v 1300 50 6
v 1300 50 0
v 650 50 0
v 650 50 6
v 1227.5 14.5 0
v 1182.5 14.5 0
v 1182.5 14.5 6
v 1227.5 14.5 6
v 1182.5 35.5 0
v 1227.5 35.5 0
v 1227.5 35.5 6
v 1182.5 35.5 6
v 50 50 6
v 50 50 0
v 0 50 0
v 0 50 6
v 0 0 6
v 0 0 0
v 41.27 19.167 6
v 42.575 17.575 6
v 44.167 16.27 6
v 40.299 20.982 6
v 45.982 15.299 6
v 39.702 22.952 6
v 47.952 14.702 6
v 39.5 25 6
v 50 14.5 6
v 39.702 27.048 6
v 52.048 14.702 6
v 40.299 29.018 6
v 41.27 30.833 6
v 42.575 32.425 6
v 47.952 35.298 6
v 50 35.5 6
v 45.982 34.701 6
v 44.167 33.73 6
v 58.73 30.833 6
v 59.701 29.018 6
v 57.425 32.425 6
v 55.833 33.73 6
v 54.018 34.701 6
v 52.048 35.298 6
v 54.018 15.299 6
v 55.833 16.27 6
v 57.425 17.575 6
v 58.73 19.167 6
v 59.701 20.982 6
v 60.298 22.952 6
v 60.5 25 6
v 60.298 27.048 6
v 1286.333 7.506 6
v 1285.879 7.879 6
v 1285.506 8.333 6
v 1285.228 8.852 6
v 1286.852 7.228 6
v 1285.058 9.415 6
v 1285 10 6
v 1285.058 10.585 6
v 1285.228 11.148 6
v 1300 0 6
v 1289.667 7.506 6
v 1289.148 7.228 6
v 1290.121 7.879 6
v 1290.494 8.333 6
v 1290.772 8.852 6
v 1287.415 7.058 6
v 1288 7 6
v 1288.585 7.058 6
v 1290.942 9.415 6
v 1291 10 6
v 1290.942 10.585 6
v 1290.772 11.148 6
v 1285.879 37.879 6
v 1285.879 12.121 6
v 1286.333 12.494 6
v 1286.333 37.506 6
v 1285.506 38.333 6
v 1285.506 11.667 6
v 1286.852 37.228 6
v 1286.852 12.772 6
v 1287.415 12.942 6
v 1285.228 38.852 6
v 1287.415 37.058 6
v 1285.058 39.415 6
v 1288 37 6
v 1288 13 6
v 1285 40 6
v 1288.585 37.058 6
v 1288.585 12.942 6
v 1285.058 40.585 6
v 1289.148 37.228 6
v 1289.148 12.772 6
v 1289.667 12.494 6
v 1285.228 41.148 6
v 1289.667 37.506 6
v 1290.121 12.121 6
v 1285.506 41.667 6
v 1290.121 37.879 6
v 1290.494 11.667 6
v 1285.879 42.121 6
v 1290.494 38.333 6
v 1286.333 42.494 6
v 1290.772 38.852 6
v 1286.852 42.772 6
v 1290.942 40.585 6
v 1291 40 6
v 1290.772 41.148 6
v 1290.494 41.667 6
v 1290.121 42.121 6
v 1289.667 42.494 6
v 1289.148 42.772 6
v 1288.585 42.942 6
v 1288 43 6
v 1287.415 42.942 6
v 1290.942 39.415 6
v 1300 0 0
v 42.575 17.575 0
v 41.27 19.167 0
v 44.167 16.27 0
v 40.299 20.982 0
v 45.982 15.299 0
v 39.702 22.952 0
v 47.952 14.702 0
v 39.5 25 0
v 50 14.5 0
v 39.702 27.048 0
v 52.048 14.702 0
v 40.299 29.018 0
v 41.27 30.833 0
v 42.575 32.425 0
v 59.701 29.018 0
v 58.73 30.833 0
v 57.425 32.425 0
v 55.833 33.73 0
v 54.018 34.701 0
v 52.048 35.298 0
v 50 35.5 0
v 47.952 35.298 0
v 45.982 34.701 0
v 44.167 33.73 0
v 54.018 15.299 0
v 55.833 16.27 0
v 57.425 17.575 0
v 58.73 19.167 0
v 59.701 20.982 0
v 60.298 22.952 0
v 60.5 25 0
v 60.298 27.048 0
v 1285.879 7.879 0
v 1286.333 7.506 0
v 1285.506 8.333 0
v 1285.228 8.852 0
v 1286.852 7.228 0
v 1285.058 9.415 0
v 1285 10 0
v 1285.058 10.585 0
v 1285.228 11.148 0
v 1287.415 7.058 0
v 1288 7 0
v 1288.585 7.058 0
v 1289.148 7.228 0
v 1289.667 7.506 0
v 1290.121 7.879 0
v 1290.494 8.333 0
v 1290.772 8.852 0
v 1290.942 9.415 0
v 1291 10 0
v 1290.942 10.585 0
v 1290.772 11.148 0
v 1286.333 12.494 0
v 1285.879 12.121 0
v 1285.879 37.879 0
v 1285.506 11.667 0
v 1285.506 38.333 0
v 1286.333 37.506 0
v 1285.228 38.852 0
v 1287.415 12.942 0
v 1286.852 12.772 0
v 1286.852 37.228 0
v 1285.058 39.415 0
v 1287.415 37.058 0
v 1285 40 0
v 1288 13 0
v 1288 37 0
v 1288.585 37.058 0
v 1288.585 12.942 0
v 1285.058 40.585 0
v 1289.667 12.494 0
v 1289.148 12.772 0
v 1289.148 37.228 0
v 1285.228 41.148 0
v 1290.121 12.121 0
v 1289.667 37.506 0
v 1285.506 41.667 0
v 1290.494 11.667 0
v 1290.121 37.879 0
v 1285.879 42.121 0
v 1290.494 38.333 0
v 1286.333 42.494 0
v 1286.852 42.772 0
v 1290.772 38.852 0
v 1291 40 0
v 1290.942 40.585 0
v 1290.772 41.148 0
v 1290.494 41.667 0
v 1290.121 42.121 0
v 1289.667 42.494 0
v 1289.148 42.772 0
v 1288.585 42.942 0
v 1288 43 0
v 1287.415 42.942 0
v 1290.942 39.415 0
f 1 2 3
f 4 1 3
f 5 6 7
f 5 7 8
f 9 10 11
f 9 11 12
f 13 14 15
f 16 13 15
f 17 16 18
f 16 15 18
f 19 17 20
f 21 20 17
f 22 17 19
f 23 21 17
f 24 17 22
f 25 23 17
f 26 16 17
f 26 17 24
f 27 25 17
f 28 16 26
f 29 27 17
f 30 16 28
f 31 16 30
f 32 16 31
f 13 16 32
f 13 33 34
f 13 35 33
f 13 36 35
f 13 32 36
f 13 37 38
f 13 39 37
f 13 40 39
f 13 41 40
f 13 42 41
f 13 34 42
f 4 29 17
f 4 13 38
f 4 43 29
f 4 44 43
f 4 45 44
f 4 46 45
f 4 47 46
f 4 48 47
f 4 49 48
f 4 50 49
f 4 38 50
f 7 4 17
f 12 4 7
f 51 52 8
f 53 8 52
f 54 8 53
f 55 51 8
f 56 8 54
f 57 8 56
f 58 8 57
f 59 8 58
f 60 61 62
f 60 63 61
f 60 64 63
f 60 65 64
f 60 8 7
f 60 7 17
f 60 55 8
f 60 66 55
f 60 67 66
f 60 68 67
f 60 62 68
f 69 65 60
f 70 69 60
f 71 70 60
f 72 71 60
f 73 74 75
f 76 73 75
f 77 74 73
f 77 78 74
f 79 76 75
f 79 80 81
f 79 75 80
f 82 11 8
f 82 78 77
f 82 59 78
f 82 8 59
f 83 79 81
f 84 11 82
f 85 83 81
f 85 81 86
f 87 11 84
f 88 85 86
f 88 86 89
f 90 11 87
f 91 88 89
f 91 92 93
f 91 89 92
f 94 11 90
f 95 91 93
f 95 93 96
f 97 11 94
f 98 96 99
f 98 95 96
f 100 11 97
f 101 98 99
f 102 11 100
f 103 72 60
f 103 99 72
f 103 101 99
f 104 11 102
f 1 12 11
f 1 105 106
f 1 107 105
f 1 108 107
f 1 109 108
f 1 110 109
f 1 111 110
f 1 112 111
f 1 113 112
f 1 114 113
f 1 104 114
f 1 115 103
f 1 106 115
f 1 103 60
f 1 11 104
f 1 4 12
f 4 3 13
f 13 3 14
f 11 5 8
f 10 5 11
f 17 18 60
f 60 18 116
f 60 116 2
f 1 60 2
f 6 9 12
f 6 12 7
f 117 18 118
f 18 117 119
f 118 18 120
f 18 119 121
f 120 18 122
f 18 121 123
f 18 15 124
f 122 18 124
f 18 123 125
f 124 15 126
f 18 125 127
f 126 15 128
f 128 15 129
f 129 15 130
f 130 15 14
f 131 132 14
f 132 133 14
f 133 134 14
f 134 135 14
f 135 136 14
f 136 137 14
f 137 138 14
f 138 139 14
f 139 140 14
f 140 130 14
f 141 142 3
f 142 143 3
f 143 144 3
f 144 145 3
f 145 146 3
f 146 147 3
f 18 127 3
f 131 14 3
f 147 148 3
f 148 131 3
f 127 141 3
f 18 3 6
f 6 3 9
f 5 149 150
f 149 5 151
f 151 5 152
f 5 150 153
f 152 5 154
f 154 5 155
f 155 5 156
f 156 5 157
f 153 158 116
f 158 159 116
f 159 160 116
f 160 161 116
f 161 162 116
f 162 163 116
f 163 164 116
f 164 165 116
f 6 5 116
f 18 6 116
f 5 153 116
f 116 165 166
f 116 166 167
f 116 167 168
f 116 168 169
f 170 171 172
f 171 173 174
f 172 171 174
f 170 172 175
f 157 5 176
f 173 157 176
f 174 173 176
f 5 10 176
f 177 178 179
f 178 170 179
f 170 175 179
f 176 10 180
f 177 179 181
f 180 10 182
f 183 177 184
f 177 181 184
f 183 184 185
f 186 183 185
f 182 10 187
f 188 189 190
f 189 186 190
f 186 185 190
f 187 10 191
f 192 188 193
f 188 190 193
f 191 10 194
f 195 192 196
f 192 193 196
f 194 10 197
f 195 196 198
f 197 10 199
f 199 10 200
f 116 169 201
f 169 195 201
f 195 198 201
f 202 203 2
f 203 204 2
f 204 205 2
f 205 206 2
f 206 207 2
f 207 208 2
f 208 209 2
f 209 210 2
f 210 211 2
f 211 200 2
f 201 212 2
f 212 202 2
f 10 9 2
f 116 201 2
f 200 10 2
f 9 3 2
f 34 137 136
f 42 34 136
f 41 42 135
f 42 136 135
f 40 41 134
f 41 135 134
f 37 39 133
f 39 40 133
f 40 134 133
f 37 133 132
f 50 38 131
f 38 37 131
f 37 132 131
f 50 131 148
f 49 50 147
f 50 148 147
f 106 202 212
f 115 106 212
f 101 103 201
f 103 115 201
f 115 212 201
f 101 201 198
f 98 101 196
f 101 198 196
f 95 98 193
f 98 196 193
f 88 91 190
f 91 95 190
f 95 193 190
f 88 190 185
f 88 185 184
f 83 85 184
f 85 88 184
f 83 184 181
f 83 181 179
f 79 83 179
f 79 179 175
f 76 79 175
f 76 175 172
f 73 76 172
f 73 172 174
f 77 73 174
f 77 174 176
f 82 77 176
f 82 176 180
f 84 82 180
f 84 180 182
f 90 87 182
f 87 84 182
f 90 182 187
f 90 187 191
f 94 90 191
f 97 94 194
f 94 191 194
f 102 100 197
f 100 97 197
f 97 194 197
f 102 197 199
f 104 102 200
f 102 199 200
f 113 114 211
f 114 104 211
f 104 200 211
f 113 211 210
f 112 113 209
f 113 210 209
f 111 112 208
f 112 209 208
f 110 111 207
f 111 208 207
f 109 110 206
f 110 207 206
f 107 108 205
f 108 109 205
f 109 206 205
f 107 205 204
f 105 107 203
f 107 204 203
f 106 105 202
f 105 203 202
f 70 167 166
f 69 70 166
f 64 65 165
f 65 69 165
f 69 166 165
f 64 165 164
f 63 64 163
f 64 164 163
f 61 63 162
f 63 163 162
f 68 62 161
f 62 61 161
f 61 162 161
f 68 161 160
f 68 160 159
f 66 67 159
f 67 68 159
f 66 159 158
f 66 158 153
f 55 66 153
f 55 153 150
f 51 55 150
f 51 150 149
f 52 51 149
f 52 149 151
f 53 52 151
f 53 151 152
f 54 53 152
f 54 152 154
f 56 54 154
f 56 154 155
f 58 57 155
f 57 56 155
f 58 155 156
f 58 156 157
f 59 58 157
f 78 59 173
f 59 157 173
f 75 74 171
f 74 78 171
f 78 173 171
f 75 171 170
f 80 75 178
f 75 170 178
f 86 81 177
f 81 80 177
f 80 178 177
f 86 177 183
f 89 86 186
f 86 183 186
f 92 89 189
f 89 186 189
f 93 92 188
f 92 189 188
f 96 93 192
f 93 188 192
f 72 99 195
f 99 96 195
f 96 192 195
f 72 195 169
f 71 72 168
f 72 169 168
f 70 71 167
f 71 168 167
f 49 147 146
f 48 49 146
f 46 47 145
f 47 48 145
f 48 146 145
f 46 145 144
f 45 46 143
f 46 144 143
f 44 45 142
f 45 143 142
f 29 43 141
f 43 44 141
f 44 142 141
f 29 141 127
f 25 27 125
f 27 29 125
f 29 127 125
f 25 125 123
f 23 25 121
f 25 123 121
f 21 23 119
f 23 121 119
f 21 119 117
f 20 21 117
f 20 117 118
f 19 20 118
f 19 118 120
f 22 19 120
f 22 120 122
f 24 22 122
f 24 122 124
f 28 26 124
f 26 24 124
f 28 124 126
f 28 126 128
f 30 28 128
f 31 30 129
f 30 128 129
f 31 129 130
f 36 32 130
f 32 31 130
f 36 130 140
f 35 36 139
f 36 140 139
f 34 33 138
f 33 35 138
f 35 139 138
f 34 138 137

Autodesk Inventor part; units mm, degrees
ref_plane "YZ Plane" through (0, 0, 0) normal (1, 0, 0) x (0, 1, 0)
ref_plane "XZ Plane" through (0, 0, 0) normal (0, 1, 0) x (-1, 0, 0)
ref_plane "XY Plane" through (0, 0, 0) normal (0, 0, 1) x (1, 0, 0)
sketch "Sketch1" plane through (0, 0, 0) normal (0, 0, 1) x (1, 0, 0)
  line L0 (0, 0) -> (1300, 0)
  line L1 (1300, 0) -> (1300, 50)
  line L2 (1300, 50) -> (0, 50)
  line L3 (0, 50) -> (0, 0)
  line L4 (0, 50) -> (50, 50)
  line L5 (50, 50) -> (50, 25)
  circle A0 centre (50, 25) radius 10.5
  line L6 (650, 50) -> (650, 17.5)
  circle A1 centre (1288, 40) radius 3
  circle A2 centre (1288, 10) radius 3
  line L7 (1182.5, 14.5) -> (1227.5, 14.5)
  line L8 (1227.5, 14.5) -> (1227.5, 35.5)
  line L9 (1227.5, 35.5) -> (1182.5, 35.5)
  line L10 (1182.5, 35.5) -> (1182.5, 14.5)
  dimension "d0" = 1300
  dimension "d1" = 50
  dimension "d4" = 50
  dimension "d5" = 21
  dimension "d10" = 6
  dimension "d11" = 6
  dimension "d14" = 45
  dimension "d17" = 21
  dimension "d18" = 14.5
  dimension "d19" = 25
  dimension "d20" = 12
  dimension "d21" = 12
  dimension "d22" = 10
extrude "Extrusion4" add sketch "Sketch1" along normal blind 6
equation "\"d18\" = -0.5 * d17 + 0.5 * d1"
properties part number "convyerwall"
